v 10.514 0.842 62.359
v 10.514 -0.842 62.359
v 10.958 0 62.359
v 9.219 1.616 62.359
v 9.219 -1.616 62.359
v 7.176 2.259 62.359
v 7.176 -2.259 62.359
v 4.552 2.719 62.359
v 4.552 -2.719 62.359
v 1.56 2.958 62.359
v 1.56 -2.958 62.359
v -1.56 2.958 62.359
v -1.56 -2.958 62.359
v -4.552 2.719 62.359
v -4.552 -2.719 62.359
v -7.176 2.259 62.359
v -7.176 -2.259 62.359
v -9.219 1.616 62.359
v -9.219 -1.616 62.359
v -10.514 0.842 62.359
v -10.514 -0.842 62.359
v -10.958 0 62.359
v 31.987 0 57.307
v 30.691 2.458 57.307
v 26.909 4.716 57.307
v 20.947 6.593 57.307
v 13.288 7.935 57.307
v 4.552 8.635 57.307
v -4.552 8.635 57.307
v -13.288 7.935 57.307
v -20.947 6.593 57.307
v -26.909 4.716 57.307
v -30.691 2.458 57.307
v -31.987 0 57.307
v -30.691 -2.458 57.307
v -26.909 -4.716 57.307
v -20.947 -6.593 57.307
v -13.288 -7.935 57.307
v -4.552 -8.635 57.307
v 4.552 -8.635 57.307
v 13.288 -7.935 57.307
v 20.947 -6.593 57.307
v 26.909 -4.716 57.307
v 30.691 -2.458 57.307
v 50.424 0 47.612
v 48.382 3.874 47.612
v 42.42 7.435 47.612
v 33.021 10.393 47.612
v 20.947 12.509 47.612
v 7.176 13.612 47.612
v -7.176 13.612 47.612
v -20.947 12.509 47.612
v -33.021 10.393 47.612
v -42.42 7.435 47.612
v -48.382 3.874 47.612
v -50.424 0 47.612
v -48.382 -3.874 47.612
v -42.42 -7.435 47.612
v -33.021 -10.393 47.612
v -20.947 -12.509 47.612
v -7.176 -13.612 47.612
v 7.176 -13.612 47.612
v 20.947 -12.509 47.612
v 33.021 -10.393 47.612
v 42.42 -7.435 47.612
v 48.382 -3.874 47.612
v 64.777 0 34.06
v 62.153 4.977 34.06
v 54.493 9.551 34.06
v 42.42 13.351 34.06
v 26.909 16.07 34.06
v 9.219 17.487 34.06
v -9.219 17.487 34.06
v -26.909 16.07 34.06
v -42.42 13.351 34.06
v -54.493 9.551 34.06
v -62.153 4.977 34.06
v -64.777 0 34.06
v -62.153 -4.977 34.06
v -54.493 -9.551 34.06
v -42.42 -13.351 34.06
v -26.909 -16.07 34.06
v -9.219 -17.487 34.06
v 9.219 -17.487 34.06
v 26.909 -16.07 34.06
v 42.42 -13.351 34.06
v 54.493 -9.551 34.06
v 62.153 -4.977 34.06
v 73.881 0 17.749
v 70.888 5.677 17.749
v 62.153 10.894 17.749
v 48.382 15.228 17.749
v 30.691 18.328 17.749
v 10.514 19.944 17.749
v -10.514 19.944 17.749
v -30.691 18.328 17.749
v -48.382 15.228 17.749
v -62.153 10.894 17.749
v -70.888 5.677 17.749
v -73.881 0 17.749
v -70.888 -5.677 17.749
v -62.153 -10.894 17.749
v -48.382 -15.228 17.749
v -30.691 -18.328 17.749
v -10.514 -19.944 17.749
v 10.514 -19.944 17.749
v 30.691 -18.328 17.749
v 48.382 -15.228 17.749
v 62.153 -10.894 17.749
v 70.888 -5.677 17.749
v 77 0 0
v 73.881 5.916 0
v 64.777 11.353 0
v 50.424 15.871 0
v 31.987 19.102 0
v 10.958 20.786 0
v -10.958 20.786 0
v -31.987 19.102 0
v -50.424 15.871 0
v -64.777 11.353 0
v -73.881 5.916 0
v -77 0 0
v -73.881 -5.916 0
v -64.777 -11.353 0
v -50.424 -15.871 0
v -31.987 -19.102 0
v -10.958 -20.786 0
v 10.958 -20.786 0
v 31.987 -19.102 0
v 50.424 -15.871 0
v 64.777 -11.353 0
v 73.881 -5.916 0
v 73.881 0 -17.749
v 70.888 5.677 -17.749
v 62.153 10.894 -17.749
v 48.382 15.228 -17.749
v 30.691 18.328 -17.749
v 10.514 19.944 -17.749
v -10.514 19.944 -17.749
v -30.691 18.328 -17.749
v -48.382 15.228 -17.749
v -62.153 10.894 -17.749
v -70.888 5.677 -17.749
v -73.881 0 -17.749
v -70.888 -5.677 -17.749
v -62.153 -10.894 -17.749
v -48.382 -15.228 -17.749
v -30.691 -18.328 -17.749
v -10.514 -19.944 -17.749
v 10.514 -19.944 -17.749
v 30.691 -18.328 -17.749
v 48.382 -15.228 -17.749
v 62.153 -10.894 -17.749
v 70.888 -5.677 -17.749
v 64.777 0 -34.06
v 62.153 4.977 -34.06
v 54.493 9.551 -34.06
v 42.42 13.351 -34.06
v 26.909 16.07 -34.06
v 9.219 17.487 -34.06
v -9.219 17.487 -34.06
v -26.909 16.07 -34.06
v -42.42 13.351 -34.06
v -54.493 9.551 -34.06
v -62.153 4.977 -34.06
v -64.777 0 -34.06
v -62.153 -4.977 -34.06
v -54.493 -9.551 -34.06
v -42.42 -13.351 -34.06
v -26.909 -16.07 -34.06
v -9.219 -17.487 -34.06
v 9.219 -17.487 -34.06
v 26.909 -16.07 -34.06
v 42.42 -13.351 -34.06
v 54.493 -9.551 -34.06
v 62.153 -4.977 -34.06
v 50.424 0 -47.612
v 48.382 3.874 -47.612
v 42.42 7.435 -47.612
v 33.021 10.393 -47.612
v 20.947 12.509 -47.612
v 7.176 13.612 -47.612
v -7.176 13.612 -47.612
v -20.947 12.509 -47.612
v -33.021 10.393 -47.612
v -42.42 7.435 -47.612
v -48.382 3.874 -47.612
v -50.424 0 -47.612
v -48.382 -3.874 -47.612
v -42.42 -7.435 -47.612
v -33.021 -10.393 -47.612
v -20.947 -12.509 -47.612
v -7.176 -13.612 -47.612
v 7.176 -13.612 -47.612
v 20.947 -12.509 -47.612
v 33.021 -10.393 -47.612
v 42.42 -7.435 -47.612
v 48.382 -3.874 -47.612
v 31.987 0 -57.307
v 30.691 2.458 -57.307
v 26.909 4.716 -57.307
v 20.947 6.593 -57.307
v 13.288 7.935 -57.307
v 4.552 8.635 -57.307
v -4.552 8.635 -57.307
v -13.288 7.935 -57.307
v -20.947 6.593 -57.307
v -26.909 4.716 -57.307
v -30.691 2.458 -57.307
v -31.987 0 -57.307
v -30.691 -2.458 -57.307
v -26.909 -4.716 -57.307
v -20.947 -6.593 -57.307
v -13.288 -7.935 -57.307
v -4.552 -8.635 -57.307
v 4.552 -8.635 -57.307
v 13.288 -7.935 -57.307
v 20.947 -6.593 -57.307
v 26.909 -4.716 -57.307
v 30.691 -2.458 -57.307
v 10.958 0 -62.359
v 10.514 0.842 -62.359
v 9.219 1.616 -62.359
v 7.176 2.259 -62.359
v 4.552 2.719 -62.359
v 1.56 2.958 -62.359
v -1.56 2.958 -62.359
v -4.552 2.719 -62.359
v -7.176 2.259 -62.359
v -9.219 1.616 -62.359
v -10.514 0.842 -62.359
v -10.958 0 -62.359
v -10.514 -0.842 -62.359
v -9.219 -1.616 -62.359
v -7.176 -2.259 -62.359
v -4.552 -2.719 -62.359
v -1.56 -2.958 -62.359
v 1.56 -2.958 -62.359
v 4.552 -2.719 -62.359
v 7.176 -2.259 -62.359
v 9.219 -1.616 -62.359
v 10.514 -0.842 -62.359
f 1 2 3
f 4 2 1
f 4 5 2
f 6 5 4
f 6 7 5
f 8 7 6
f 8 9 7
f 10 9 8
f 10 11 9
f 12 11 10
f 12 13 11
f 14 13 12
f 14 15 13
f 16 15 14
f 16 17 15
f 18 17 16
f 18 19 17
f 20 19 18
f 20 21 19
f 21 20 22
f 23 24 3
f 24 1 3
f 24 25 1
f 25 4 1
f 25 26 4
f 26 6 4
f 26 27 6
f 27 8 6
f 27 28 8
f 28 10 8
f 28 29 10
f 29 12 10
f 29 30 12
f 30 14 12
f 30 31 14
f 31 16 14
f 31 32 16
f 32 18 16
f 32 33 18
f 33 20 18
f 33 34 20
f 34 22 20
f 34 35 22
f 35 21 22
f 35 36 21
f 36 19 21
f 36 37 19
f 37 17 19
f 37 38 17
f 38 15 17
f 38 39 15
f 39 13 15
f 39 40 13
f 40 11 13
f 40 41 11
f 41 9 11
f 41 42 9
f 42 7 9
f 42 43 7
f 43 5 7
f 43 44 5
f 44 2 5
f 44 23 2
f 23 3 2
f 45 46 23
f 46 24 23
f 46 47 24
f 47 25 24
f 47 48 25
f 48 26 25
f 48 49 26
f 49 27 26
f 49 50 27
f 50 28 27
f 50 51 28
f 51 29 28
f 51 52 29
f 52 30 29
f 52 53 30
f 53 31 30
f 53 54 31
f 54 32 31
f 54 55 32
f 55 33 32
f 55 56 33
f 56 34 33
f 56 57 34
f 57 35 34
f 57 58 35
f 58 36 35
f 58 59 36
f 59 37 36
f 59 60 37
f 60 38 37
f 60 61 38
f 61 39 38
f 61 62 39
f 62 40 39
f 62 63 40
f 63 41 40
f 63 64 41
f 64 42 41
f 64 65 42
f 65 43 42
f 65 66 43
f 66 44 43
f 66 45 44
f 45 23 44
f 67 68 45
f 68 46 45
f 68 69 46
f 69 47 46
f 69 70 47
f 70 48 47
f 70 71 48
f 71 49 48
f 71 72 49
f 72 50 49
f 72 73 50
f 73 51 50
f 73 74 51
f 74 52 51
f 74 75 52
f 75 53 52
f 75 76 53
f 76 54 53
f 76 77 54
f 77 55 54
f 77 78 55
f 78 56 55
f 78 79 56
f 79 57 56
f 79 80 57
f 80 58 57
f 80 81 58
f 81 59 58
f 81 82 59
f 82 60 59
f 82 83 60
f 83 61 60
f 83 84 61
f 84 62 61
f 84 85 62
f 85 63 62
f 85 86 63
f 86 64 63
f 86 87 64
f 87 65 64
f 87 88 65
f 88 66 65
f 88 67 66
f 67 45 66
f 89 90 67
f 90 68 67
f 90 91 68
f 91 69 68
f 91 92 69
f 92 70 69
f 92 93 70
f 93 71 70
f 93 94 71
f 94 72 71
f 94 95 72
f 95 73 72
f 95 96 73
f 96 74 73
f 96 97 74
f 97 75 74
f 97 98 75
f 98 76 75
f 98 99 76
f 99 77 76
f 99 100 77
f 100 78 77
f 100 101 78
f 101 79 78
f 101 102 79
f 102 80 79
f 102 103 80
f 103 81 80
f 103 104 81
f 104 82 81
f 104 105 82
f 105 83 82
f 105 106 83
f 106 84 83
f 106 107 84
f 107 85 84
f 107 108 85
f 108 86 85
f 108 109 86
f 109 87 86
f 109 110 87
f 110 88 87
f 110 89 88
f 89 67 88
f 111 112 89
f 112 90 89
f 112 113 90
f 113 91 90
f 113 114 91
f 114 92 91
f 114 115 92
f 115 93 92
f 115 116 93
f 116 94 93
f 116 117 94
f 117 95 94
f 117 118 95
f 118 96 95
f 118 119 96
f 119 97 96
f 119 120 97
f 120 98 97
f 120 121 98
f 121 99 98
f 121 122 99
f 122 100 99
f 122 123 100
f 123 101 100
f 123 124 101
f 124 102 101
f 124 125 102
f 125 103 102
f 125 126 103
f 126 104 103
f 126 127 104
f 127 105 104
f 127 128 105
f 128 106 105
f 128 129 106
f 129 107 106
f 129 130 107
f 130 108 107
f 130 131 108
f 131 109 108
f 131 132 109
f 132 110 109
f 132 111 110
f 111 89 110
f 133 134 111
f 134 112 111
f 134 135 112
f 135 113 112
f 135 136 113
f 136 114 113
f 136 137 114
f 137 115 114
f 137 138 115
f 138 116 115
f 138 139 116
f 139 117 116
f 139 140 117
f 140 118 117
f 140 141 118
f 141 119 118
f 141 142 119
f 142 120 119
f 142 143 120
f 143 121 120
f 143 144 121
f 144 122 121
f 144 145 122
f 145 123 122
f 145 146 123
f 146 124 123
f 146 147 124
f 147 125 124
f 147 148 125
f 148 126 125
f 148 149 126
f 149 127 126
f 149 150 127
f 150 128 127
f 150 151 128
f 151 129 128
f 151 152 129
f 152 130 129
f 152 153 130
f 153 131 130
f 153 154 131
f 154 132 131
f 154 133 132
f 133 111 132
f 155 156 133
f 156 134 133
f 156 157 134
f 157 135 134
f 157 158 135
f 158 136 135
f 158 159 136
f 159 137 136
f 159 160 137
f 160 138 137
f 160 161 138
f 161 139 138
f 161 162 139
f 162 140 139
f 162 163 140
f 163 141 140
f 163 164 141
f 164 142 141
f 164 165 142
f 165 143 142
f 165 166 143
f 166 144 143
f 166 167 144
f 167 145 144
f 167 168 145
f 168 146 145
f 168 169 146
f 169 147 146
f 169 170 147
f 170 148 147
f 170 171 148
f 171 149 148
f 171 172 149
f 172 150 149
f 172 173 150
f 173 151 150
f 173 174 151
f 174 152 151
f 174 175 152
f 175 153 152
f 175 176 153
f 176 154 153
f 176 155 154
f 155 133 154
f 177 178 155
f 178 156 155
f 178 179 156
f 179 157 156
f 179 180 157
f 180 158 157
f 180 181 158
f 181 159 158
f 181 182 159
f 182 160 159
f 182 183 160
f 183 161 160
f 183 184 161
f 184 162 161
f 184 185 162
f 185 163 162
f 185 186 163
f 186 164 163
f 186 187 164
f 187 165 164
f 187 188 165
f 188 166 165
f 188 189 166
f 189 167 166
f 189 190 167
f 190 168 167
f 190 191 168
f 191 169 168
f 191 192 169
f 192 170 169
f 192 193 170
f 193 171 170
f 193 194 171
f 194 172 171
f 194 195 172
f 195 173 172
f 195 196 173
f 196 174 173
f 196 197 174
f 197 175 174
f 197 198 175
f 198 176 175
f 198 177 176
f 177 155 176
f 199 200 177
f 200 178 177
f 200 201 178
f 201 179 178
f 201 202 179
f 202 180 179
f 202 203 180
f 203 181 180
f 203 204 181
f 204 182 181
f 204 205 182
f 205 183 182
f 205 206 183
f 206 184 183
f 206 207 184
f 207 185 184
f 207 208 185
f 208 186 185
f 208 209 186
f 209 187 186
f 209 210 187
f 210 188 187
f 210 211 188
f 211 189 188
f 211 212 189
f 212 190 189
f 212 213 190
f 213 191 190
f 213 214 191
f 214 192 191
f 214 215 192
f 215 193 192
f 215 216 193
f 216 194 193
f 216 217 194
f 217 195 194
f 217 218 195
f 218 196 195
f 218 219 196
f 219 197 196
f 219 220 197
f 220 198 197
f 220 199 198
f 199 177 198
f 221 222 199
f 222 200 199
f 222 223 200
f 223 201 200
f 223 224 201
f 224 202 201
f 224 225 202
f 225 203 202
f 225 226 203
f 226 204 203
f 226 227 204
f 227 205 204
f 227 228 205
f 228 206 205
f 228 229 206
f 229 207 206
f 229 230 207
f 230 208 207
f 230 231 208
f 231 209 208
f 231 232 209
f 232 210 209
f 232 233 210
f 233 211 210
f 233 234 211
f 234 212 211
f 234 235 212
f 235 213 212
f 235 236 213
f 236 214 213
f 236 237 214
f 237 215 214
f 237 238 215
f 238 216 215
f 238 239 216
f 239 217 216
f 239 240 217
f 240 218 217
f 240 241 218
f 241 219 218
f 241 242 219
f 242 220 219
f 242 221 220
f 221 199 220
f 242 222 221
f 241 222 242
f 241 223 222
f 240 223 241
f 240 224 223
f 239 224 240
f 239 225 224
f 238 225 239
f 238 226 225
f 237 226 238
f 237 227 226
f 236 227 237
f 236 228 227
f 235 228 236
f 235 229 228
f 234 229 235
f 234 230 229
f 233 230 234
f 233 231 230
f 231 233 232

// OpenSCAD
// Generated by SolidPython 1.0.1 on 2020-07-29 00:46:49


scale(v = [11, 3, 9]) {
	sphere(r = 7);
}
/***********************************************
*********      SolidPython code:      **********
************************************************
 
# import packages: SolidPython
from solid import *
from solid.utils import *
from itertools import chain, combinations, permutations


class Resize:

    def __init__(self, scad_file):
        self.scad_file = scad_file
        #self.scad_file = import_scad(scad_file)
        # cone/cylinder param:
        self.r1 = 0
        self.r2 = 0
        self.h = 0
        # rectangular prism param:
        self.w = 0
        self.l = 0
        # ellipse param:
        self.r = 0

    # import OpenScad code (file name corresponds to shape)


    # classify shape + parameters
    def assign(self, param1, param2, param3):
        if self.scad_file == 'cone.scad':
            self.r1 = param1
            self.r2 = param2
            self.h = param3
        elif self.scad_file == 'cylinder.scad':
            self.r1 = param1
            self.r2 = param2
            self.h = param3
        elif self.scad_file == 'rectangularPrism.scad':
            self.h = param1
            self.l = param2
            self.w = param3
        else:
            self.r = param1
            self.h = param2

    # resize parameters
    def iterate(self):
        x = range(3, 20, 2)
        i = 1
        if self.scad_file == 'cone.scad':
            tempList = list(permutations(x, 2))
            for temp in tempList:
                param1 = temp[0]
                param2 = temp[1]
                filepath = 'produced_scad_files/' + 'cone' + str(param1) + '_' + str(param2) + '_' + '.scad'
                scad_render_to_file(cylinder(h=param1, r1=param2, r2=0), filepath)

        elif self.scad_file == 'cylinder.scad':
            tempList = list(permutations(x, 3))
            for temp in tempList:
                param1 = temp[0]
                param2 = temp[1]
                filepath = 'produced_scad_files/' + 'cylinder' + str(param1) + '_' + str(param2) + '_' + '.scad'
                scad_render_to_file(cylinder(h=param1, r1=param2, r2=param2), filepath)

        elif self.scad_file == 'rectangularPrism.scad':
            tempList = list(permutations(x, 3))
            for temp in tempList:
                param1 = temp[0]
                param2 = temp[1]
                param3 = temp[2]
                filepath = 'produced_scad_files/' + 'rectangularPrism' + str(param1) + '_' + str(param2) + '_' + str(
                    param3) + '.scad'
                scad_render_to_file(cube(size=(param1, param2, param3)), filepath)

        elif self.scad_file == 'ellipse.scad':
            tempList = list(permutations(x, 4))
            for temp in tempList:
                param1 = temp[0]
                param2 = temp[1]
                param3 = temp[2]
                param4 = temp[3]
                filepath = 'produced_scad_files/' + 'ellipse' + str(param1) + '_' + str(param2) + '_' + str(param3) + '_' + str(param4) + '.scad'
                scad_render_to_file(scale([param1, param2, param3])(sphere(r=param4)), filepath)

    def render_to_scadfile(self):
        scad_render_to_file(scad, 'example.scad') 
 
************************************************/
